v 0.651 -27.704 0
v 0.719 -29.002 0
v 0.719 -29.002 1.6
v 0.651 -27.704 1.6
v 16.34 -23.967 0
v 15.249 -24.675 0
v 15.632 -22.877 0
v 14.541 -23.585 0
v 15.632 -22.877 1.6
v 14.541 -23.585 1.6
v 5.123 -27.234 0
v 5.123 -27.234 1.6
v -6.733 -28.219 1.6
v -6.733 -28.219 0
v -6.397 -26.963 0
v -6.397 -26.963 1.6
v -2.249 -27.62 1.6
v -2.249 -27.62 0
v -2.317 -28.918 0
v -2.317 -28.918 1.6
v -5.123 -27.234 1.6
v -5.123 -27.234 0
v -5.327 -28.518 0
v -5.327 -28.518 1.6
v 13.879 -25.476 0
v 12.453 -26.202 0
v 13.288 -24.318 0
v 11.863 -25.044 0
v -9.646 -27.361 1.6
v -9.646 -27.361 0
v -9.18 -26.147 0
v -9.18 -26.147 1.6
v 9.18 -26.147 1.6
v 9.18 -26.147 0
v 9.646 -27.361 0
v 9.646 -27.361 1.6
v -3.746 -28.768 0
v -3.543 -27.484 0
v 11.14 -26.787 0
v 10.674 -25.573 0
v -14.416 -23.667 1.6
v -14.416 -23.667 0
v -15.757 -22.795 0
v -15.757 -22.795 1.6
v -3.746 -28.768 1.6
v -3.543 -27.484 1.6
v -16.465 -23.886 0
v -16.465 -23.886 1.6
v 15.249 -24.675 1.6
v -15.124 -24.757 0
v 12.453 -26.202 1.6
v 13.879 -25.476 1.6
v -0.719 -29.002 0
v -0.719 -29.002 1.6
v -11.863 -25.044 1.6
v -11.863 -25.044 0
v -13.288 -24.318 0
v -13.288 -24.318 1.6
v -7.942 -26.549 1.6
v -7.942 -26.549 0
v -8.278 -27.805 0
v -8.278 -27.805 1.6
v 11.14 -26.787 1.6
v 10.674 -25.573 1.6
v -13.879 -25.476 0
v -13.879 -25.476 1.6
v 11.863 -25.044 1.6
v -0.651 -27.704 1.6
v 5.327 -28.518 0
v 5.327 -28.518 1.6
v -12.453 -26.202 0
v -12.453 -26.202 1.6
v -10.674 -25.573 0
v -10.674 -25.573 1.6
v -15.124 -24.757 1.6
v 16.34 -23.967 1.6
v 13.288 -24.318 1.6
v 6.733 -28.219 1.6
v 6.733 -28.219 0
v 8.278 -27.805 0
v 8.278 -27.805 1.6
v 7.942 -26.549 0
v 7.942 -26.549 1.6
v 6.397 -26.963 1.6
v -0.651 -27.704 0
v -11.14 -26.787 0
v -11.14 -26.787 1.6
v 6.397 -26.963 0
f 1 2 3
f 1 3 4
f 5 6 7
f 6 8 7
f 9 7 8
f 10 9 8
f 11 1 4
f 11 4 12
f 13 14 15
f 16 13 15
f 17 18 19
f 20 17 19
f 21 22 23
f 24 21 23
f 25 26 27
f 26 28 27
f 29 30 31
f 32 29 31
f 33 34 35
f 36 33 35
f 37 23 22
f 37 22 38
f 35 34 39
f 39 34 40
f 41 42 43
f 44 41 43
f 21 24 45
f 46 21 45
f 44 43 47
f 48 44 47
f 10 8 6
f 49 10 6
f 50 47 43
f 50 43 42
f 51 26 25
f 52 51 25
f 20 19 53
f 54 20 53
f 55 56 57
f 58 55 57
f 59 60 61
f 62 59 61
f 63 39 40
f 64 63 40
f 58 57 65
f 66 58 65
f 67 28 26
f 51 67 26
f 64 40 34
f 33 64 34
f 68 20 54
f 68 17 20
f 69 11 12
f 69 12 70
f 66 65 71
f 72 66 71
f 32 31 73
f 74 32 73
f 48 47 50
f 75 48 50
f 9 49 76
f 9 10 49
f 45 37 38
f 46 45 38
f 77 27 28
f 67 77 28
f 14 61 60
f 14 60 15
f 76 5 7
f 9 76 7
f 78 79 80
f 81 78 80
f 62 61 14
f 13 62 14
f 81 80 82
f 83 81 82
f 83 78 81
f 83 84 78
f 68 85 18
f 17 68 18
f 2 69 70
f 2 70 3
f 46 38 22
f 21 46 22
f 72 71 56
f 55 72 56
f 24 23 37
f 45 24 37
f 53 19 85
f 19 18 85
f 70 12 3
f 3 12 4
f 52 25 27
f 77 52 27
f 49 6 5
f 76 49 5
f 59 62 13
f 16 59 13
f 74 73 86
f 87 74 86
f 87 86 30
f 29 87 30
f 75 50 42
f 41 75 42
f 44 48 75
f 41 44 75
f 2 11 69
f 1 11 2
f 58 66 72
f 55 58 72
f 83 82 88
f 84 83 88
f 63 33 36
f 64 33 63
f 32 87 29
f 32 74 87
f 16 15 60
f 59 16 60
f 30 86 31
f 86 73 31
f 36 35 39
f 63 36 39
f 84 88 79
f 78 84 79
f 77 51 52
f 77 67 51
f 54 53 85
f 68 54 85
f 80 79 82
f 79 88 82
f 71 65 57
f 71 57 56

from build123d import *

# Parameters (mm, degrees)
CONTACTS_DEPTH    = 1.6
CONTACTS_2_DEPTH  = 1.6
CONTACTS_3_DEPTH  = 1.6
CONTACTS_4_DEPTH  = 1.6
CONTACTS_5_DEPTH  = 1.6
CONTACTS_6_DEPTH  = 1.6
CONTACTS_7_DEPTH  = 1.6
CONTACTS_8_DEPTH  = 1.6
CONTACTS_9_DEPTH  = 1.6
CONTACTS_10_DEPTH = 1.6
CONTACTS_11_DEPTH = 1.6


with BuildPart() as part:
    # Sketch3 → Contacts (new body)
    with BuildSketch(Plane.XY):
        Polygon((-16.46546847, -23.885735242), (-15.123595561, -24.757157698), (-14.415564816, -23.66688596), (-15.757437724, -22.795463504), align=None)
    extrude(amount=CONTACTS_DEPTH)


with BuildPart() as body_2:
    # Sketch3 → Contacts 2 (new body)
    with BuildSketch(Plane.XY):
        Polygon((-13.878529712, -25.475996802), (-12.452919273, -26.202381601), (-11.862731623, -25.04407312), (-13.288342062, -24.31768832), align=None)
    extrude(amount=CONTACTS_2_DEPTH)


with BuildPart() as body_3:
    # Sketch3 → Contacts 3 (new body)
    with BuildSketch(Plane.XY):
        Polygon((-11.139534878, -26.787138009), (-9.645806196, -27.360526728), (-9.179927861, -26.146872174), (-10.673656544, -25.573483454), align=None)
    extrude(amount=CONTACTS_3_DEPTH)


with BuildPart() as body_4:
    # Sketch3 → Contacts 4 (new body)
    with BuildSketch(Plane.XY):
        Polygon((-8.278492969, -27.804793726), (-6.733011647, -28.218904198), (-6.396546888, -26.963200624), (-7.94202821, -26.549090152), align=None)
    extrude(amount=CONTACTS_4_DEPTH)


with BuildPart() as body_5:
    # Sketch3 → Contacts 5 (new body)
    with BuildSketch(Plane.XY):
        Polygon((-5.326750159, -28.517814305), (-3.746448814, -28.768109449), (-3.543084009, -27.484114607), (-5.123385354, -27.233819462), align=None)
    extrude(amount=CONTACTS_5_DEPTH)


with BuildPart() as body_6:
    # Sketch3 → Contacts 6 (new body)
    with BuildSketch(Plane.XY):
        Polygon((-2.316646359, -28.918387743), (-0.718839103, -29.002125273), (-0.65080236, -27.703906878), (-2.248609616, -27.620169348), align=None)
    extrude(amount=CONTACTS_6_DEPTH)


with BuildPart() as body_7:
    # Sketch3 → Contacts 7 (new body)
    with BuildSketch(Plane.XY):
        Polygon((0.718839103, -29.002125273), (0.65080236, -27.703906878), (5.123385354, -27.233819462), (5.326750159, -28.517814305), align=None)
    extrude(amount=CONTACTS_7_DEPTH)


with BuildPart() as body_8:
    # Sketch3 → Contacts 8 (new body)
    with BuildSketch(Plane.XY):
        Polygon((6.733011647, -28.218904198), (8.278492969, -27.804793726), (7.94202821, -26.549090152), (6.396546888, -26.963200624), align=None)
    extrude(amount=CONTACTS_8_DEPTH)


with BuildPart() as body_9:
    # Sketch3 → Contacts 9 (new body)
    with BuildSketch(Plane.XY):
        Polygon((9.645806196, -27.360526728), (11.139534878, -26.787138009), (10.673656544, -25.573483454), (9.179927861, -26.146872174), align=None)
    extrude(amount=CONTACTS_9_DEPTH)


with BuildPart() as body_10:
    # Sketch3 → Contacts 10 (new body)
    with BuildSketch(Plane.XY):
        Polygon((12.452919273, -26.202381601), (13.878529712, -25.475996802), (13.288342062, -24.31768832), (11.862731623, -25.04407312), align=None)
    extrude(amount=CONTACTS_10_DEPTH)


with BuildPart() as body_11:
    # Sketch3 → Contacts 11 (new body)
    with BuildSketch(Plane.XY):
        Polygon((15.249396146, -24.675461843), (16.339667885, -23.967431098), (15.631637139, -22.877159359), (14.541365401, -23.585190105), align=None)
    extrude(amount=CONTACTS_11_DEPTH)


solid = Compound([part.part, body_2.part, body_3.part, body_4.part, body_5.part, body_6.part, body_7.part, body_8.part, body_9.part, body_10.part, body_11.part])
